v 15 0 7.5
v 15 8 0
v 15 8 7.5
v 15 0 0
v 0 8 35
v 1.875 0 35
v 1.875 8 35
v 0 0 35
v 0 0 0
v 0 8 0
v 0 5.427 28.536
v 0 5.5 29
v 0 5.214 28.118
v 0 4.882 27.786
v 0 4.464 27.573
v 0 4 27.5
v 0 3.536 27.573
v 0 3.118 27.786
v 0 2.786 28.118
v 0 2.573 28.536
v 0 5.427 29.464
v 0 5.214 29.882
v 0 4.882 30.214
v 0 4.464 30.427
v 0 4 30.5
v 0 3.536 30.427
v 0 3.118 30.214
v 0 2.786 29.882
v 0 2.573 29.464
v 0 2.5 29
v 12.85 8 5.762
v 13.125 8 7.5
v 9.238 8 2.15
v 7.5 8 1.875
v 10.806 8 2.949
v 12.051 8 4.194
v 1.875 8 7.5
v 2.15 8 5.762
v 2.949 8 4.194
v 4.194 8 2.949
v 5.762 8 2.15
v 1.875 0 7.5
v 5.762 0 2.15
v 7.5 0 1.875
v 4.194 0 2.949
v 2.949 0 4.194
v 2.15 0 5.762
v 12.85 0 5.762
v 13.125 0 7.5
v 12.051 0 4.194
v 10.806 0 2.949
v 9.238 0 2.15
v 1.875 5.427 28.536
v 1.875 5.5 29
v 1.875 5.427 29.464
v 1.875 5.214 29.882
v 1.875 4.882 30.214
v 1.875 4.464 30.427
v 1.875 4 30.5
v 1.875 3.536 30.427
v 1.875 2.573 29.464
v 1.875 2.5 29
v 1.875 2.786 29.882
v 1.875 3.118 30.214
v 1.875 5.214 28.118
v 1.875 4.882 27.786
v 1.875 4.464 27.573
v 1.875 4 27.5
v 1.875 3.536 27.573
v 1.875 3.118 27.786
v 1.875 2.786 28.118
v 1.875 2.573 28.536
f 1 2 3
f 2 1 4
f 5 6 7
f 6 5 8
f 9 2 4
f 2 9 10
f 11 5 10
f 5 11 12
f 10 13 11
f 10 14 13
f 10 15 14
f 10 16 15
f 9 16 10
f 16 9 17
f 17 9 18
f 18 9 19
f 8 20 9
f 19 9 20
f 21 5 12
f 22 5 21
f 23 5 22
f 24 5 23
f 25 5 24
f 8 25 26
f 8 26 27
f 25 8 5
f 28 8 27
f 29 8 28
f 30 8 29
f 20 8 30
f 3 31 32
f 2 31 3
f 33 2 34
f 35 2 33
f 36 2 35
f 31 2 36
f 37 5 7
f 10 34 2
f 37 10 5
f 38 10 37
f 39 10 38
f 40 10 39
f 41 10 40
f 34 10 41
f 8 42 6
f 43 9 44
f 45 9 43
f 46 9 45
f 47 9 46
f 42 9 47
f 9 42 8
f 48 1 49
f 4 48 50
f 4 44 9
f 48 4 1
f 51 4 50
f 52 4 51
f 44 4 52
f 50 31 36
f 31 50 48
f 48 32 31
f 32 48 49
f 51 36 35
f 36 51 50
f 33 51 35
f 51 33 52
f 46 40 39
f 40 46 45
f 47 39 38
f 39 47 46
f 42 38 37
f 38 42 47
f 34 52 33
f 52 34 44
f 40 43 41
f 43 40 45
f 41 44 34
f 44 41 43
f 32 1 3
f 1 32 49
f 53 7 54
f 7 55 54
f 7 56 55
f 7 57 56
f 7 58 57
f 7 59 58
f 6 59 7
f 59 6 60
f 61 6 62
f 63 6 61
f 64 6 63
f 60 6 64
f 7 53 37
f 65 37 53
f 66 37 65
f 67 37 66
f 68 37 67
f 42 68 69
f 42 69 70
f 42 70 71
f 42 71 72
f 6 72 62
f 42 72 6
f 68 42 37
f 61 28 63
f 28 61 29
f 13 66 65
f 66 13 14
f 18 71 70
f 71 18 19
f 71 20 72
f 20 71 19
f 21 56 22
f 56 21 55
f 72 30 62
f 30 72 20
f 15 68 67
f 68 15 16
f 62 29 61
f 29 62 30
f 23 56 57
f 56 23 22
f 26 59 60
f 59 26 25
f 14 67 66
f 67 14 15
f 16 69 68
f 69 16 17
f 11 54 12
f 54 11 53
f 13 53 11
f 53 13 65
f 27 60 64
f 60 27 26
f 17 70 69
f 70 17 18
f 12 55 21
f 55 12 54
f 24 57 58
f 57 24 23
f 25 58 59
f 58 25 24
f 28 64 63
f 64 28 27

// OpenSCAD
//Width
w=15;
//Height
h=35;
//Thickness
t=8;
//Hole Diameter
d=3;
//Resolution
$fn = 20;

//Tim Billman
//MSE4777
//10/8/2018
//Initial intention of the model is to familiarize myself with parametric modeling in OpenSCAD

//Build Code
difference () {    
cube([w,t,h]); //initial shape
    
rotate (a=[-90,0,0]) translate([w/2,-w/2,-.5*t]) cylinder(d=.75*w,h=2*t); //subtract hook shape while keeping centered
    
translate([.125*w,-.5*t,w/2]) cube([w,t*2,h]); //subtract remaining material in line with radius of prior cylinder subtraction
    
rotate (a=[0,90,0]) translate([-h+(2*d),t/2,0-.5*t]) cylinder(d=d,h=t*2); //nail or screw hole modeled to always be proportinally near to the top relative to the hole size
}
